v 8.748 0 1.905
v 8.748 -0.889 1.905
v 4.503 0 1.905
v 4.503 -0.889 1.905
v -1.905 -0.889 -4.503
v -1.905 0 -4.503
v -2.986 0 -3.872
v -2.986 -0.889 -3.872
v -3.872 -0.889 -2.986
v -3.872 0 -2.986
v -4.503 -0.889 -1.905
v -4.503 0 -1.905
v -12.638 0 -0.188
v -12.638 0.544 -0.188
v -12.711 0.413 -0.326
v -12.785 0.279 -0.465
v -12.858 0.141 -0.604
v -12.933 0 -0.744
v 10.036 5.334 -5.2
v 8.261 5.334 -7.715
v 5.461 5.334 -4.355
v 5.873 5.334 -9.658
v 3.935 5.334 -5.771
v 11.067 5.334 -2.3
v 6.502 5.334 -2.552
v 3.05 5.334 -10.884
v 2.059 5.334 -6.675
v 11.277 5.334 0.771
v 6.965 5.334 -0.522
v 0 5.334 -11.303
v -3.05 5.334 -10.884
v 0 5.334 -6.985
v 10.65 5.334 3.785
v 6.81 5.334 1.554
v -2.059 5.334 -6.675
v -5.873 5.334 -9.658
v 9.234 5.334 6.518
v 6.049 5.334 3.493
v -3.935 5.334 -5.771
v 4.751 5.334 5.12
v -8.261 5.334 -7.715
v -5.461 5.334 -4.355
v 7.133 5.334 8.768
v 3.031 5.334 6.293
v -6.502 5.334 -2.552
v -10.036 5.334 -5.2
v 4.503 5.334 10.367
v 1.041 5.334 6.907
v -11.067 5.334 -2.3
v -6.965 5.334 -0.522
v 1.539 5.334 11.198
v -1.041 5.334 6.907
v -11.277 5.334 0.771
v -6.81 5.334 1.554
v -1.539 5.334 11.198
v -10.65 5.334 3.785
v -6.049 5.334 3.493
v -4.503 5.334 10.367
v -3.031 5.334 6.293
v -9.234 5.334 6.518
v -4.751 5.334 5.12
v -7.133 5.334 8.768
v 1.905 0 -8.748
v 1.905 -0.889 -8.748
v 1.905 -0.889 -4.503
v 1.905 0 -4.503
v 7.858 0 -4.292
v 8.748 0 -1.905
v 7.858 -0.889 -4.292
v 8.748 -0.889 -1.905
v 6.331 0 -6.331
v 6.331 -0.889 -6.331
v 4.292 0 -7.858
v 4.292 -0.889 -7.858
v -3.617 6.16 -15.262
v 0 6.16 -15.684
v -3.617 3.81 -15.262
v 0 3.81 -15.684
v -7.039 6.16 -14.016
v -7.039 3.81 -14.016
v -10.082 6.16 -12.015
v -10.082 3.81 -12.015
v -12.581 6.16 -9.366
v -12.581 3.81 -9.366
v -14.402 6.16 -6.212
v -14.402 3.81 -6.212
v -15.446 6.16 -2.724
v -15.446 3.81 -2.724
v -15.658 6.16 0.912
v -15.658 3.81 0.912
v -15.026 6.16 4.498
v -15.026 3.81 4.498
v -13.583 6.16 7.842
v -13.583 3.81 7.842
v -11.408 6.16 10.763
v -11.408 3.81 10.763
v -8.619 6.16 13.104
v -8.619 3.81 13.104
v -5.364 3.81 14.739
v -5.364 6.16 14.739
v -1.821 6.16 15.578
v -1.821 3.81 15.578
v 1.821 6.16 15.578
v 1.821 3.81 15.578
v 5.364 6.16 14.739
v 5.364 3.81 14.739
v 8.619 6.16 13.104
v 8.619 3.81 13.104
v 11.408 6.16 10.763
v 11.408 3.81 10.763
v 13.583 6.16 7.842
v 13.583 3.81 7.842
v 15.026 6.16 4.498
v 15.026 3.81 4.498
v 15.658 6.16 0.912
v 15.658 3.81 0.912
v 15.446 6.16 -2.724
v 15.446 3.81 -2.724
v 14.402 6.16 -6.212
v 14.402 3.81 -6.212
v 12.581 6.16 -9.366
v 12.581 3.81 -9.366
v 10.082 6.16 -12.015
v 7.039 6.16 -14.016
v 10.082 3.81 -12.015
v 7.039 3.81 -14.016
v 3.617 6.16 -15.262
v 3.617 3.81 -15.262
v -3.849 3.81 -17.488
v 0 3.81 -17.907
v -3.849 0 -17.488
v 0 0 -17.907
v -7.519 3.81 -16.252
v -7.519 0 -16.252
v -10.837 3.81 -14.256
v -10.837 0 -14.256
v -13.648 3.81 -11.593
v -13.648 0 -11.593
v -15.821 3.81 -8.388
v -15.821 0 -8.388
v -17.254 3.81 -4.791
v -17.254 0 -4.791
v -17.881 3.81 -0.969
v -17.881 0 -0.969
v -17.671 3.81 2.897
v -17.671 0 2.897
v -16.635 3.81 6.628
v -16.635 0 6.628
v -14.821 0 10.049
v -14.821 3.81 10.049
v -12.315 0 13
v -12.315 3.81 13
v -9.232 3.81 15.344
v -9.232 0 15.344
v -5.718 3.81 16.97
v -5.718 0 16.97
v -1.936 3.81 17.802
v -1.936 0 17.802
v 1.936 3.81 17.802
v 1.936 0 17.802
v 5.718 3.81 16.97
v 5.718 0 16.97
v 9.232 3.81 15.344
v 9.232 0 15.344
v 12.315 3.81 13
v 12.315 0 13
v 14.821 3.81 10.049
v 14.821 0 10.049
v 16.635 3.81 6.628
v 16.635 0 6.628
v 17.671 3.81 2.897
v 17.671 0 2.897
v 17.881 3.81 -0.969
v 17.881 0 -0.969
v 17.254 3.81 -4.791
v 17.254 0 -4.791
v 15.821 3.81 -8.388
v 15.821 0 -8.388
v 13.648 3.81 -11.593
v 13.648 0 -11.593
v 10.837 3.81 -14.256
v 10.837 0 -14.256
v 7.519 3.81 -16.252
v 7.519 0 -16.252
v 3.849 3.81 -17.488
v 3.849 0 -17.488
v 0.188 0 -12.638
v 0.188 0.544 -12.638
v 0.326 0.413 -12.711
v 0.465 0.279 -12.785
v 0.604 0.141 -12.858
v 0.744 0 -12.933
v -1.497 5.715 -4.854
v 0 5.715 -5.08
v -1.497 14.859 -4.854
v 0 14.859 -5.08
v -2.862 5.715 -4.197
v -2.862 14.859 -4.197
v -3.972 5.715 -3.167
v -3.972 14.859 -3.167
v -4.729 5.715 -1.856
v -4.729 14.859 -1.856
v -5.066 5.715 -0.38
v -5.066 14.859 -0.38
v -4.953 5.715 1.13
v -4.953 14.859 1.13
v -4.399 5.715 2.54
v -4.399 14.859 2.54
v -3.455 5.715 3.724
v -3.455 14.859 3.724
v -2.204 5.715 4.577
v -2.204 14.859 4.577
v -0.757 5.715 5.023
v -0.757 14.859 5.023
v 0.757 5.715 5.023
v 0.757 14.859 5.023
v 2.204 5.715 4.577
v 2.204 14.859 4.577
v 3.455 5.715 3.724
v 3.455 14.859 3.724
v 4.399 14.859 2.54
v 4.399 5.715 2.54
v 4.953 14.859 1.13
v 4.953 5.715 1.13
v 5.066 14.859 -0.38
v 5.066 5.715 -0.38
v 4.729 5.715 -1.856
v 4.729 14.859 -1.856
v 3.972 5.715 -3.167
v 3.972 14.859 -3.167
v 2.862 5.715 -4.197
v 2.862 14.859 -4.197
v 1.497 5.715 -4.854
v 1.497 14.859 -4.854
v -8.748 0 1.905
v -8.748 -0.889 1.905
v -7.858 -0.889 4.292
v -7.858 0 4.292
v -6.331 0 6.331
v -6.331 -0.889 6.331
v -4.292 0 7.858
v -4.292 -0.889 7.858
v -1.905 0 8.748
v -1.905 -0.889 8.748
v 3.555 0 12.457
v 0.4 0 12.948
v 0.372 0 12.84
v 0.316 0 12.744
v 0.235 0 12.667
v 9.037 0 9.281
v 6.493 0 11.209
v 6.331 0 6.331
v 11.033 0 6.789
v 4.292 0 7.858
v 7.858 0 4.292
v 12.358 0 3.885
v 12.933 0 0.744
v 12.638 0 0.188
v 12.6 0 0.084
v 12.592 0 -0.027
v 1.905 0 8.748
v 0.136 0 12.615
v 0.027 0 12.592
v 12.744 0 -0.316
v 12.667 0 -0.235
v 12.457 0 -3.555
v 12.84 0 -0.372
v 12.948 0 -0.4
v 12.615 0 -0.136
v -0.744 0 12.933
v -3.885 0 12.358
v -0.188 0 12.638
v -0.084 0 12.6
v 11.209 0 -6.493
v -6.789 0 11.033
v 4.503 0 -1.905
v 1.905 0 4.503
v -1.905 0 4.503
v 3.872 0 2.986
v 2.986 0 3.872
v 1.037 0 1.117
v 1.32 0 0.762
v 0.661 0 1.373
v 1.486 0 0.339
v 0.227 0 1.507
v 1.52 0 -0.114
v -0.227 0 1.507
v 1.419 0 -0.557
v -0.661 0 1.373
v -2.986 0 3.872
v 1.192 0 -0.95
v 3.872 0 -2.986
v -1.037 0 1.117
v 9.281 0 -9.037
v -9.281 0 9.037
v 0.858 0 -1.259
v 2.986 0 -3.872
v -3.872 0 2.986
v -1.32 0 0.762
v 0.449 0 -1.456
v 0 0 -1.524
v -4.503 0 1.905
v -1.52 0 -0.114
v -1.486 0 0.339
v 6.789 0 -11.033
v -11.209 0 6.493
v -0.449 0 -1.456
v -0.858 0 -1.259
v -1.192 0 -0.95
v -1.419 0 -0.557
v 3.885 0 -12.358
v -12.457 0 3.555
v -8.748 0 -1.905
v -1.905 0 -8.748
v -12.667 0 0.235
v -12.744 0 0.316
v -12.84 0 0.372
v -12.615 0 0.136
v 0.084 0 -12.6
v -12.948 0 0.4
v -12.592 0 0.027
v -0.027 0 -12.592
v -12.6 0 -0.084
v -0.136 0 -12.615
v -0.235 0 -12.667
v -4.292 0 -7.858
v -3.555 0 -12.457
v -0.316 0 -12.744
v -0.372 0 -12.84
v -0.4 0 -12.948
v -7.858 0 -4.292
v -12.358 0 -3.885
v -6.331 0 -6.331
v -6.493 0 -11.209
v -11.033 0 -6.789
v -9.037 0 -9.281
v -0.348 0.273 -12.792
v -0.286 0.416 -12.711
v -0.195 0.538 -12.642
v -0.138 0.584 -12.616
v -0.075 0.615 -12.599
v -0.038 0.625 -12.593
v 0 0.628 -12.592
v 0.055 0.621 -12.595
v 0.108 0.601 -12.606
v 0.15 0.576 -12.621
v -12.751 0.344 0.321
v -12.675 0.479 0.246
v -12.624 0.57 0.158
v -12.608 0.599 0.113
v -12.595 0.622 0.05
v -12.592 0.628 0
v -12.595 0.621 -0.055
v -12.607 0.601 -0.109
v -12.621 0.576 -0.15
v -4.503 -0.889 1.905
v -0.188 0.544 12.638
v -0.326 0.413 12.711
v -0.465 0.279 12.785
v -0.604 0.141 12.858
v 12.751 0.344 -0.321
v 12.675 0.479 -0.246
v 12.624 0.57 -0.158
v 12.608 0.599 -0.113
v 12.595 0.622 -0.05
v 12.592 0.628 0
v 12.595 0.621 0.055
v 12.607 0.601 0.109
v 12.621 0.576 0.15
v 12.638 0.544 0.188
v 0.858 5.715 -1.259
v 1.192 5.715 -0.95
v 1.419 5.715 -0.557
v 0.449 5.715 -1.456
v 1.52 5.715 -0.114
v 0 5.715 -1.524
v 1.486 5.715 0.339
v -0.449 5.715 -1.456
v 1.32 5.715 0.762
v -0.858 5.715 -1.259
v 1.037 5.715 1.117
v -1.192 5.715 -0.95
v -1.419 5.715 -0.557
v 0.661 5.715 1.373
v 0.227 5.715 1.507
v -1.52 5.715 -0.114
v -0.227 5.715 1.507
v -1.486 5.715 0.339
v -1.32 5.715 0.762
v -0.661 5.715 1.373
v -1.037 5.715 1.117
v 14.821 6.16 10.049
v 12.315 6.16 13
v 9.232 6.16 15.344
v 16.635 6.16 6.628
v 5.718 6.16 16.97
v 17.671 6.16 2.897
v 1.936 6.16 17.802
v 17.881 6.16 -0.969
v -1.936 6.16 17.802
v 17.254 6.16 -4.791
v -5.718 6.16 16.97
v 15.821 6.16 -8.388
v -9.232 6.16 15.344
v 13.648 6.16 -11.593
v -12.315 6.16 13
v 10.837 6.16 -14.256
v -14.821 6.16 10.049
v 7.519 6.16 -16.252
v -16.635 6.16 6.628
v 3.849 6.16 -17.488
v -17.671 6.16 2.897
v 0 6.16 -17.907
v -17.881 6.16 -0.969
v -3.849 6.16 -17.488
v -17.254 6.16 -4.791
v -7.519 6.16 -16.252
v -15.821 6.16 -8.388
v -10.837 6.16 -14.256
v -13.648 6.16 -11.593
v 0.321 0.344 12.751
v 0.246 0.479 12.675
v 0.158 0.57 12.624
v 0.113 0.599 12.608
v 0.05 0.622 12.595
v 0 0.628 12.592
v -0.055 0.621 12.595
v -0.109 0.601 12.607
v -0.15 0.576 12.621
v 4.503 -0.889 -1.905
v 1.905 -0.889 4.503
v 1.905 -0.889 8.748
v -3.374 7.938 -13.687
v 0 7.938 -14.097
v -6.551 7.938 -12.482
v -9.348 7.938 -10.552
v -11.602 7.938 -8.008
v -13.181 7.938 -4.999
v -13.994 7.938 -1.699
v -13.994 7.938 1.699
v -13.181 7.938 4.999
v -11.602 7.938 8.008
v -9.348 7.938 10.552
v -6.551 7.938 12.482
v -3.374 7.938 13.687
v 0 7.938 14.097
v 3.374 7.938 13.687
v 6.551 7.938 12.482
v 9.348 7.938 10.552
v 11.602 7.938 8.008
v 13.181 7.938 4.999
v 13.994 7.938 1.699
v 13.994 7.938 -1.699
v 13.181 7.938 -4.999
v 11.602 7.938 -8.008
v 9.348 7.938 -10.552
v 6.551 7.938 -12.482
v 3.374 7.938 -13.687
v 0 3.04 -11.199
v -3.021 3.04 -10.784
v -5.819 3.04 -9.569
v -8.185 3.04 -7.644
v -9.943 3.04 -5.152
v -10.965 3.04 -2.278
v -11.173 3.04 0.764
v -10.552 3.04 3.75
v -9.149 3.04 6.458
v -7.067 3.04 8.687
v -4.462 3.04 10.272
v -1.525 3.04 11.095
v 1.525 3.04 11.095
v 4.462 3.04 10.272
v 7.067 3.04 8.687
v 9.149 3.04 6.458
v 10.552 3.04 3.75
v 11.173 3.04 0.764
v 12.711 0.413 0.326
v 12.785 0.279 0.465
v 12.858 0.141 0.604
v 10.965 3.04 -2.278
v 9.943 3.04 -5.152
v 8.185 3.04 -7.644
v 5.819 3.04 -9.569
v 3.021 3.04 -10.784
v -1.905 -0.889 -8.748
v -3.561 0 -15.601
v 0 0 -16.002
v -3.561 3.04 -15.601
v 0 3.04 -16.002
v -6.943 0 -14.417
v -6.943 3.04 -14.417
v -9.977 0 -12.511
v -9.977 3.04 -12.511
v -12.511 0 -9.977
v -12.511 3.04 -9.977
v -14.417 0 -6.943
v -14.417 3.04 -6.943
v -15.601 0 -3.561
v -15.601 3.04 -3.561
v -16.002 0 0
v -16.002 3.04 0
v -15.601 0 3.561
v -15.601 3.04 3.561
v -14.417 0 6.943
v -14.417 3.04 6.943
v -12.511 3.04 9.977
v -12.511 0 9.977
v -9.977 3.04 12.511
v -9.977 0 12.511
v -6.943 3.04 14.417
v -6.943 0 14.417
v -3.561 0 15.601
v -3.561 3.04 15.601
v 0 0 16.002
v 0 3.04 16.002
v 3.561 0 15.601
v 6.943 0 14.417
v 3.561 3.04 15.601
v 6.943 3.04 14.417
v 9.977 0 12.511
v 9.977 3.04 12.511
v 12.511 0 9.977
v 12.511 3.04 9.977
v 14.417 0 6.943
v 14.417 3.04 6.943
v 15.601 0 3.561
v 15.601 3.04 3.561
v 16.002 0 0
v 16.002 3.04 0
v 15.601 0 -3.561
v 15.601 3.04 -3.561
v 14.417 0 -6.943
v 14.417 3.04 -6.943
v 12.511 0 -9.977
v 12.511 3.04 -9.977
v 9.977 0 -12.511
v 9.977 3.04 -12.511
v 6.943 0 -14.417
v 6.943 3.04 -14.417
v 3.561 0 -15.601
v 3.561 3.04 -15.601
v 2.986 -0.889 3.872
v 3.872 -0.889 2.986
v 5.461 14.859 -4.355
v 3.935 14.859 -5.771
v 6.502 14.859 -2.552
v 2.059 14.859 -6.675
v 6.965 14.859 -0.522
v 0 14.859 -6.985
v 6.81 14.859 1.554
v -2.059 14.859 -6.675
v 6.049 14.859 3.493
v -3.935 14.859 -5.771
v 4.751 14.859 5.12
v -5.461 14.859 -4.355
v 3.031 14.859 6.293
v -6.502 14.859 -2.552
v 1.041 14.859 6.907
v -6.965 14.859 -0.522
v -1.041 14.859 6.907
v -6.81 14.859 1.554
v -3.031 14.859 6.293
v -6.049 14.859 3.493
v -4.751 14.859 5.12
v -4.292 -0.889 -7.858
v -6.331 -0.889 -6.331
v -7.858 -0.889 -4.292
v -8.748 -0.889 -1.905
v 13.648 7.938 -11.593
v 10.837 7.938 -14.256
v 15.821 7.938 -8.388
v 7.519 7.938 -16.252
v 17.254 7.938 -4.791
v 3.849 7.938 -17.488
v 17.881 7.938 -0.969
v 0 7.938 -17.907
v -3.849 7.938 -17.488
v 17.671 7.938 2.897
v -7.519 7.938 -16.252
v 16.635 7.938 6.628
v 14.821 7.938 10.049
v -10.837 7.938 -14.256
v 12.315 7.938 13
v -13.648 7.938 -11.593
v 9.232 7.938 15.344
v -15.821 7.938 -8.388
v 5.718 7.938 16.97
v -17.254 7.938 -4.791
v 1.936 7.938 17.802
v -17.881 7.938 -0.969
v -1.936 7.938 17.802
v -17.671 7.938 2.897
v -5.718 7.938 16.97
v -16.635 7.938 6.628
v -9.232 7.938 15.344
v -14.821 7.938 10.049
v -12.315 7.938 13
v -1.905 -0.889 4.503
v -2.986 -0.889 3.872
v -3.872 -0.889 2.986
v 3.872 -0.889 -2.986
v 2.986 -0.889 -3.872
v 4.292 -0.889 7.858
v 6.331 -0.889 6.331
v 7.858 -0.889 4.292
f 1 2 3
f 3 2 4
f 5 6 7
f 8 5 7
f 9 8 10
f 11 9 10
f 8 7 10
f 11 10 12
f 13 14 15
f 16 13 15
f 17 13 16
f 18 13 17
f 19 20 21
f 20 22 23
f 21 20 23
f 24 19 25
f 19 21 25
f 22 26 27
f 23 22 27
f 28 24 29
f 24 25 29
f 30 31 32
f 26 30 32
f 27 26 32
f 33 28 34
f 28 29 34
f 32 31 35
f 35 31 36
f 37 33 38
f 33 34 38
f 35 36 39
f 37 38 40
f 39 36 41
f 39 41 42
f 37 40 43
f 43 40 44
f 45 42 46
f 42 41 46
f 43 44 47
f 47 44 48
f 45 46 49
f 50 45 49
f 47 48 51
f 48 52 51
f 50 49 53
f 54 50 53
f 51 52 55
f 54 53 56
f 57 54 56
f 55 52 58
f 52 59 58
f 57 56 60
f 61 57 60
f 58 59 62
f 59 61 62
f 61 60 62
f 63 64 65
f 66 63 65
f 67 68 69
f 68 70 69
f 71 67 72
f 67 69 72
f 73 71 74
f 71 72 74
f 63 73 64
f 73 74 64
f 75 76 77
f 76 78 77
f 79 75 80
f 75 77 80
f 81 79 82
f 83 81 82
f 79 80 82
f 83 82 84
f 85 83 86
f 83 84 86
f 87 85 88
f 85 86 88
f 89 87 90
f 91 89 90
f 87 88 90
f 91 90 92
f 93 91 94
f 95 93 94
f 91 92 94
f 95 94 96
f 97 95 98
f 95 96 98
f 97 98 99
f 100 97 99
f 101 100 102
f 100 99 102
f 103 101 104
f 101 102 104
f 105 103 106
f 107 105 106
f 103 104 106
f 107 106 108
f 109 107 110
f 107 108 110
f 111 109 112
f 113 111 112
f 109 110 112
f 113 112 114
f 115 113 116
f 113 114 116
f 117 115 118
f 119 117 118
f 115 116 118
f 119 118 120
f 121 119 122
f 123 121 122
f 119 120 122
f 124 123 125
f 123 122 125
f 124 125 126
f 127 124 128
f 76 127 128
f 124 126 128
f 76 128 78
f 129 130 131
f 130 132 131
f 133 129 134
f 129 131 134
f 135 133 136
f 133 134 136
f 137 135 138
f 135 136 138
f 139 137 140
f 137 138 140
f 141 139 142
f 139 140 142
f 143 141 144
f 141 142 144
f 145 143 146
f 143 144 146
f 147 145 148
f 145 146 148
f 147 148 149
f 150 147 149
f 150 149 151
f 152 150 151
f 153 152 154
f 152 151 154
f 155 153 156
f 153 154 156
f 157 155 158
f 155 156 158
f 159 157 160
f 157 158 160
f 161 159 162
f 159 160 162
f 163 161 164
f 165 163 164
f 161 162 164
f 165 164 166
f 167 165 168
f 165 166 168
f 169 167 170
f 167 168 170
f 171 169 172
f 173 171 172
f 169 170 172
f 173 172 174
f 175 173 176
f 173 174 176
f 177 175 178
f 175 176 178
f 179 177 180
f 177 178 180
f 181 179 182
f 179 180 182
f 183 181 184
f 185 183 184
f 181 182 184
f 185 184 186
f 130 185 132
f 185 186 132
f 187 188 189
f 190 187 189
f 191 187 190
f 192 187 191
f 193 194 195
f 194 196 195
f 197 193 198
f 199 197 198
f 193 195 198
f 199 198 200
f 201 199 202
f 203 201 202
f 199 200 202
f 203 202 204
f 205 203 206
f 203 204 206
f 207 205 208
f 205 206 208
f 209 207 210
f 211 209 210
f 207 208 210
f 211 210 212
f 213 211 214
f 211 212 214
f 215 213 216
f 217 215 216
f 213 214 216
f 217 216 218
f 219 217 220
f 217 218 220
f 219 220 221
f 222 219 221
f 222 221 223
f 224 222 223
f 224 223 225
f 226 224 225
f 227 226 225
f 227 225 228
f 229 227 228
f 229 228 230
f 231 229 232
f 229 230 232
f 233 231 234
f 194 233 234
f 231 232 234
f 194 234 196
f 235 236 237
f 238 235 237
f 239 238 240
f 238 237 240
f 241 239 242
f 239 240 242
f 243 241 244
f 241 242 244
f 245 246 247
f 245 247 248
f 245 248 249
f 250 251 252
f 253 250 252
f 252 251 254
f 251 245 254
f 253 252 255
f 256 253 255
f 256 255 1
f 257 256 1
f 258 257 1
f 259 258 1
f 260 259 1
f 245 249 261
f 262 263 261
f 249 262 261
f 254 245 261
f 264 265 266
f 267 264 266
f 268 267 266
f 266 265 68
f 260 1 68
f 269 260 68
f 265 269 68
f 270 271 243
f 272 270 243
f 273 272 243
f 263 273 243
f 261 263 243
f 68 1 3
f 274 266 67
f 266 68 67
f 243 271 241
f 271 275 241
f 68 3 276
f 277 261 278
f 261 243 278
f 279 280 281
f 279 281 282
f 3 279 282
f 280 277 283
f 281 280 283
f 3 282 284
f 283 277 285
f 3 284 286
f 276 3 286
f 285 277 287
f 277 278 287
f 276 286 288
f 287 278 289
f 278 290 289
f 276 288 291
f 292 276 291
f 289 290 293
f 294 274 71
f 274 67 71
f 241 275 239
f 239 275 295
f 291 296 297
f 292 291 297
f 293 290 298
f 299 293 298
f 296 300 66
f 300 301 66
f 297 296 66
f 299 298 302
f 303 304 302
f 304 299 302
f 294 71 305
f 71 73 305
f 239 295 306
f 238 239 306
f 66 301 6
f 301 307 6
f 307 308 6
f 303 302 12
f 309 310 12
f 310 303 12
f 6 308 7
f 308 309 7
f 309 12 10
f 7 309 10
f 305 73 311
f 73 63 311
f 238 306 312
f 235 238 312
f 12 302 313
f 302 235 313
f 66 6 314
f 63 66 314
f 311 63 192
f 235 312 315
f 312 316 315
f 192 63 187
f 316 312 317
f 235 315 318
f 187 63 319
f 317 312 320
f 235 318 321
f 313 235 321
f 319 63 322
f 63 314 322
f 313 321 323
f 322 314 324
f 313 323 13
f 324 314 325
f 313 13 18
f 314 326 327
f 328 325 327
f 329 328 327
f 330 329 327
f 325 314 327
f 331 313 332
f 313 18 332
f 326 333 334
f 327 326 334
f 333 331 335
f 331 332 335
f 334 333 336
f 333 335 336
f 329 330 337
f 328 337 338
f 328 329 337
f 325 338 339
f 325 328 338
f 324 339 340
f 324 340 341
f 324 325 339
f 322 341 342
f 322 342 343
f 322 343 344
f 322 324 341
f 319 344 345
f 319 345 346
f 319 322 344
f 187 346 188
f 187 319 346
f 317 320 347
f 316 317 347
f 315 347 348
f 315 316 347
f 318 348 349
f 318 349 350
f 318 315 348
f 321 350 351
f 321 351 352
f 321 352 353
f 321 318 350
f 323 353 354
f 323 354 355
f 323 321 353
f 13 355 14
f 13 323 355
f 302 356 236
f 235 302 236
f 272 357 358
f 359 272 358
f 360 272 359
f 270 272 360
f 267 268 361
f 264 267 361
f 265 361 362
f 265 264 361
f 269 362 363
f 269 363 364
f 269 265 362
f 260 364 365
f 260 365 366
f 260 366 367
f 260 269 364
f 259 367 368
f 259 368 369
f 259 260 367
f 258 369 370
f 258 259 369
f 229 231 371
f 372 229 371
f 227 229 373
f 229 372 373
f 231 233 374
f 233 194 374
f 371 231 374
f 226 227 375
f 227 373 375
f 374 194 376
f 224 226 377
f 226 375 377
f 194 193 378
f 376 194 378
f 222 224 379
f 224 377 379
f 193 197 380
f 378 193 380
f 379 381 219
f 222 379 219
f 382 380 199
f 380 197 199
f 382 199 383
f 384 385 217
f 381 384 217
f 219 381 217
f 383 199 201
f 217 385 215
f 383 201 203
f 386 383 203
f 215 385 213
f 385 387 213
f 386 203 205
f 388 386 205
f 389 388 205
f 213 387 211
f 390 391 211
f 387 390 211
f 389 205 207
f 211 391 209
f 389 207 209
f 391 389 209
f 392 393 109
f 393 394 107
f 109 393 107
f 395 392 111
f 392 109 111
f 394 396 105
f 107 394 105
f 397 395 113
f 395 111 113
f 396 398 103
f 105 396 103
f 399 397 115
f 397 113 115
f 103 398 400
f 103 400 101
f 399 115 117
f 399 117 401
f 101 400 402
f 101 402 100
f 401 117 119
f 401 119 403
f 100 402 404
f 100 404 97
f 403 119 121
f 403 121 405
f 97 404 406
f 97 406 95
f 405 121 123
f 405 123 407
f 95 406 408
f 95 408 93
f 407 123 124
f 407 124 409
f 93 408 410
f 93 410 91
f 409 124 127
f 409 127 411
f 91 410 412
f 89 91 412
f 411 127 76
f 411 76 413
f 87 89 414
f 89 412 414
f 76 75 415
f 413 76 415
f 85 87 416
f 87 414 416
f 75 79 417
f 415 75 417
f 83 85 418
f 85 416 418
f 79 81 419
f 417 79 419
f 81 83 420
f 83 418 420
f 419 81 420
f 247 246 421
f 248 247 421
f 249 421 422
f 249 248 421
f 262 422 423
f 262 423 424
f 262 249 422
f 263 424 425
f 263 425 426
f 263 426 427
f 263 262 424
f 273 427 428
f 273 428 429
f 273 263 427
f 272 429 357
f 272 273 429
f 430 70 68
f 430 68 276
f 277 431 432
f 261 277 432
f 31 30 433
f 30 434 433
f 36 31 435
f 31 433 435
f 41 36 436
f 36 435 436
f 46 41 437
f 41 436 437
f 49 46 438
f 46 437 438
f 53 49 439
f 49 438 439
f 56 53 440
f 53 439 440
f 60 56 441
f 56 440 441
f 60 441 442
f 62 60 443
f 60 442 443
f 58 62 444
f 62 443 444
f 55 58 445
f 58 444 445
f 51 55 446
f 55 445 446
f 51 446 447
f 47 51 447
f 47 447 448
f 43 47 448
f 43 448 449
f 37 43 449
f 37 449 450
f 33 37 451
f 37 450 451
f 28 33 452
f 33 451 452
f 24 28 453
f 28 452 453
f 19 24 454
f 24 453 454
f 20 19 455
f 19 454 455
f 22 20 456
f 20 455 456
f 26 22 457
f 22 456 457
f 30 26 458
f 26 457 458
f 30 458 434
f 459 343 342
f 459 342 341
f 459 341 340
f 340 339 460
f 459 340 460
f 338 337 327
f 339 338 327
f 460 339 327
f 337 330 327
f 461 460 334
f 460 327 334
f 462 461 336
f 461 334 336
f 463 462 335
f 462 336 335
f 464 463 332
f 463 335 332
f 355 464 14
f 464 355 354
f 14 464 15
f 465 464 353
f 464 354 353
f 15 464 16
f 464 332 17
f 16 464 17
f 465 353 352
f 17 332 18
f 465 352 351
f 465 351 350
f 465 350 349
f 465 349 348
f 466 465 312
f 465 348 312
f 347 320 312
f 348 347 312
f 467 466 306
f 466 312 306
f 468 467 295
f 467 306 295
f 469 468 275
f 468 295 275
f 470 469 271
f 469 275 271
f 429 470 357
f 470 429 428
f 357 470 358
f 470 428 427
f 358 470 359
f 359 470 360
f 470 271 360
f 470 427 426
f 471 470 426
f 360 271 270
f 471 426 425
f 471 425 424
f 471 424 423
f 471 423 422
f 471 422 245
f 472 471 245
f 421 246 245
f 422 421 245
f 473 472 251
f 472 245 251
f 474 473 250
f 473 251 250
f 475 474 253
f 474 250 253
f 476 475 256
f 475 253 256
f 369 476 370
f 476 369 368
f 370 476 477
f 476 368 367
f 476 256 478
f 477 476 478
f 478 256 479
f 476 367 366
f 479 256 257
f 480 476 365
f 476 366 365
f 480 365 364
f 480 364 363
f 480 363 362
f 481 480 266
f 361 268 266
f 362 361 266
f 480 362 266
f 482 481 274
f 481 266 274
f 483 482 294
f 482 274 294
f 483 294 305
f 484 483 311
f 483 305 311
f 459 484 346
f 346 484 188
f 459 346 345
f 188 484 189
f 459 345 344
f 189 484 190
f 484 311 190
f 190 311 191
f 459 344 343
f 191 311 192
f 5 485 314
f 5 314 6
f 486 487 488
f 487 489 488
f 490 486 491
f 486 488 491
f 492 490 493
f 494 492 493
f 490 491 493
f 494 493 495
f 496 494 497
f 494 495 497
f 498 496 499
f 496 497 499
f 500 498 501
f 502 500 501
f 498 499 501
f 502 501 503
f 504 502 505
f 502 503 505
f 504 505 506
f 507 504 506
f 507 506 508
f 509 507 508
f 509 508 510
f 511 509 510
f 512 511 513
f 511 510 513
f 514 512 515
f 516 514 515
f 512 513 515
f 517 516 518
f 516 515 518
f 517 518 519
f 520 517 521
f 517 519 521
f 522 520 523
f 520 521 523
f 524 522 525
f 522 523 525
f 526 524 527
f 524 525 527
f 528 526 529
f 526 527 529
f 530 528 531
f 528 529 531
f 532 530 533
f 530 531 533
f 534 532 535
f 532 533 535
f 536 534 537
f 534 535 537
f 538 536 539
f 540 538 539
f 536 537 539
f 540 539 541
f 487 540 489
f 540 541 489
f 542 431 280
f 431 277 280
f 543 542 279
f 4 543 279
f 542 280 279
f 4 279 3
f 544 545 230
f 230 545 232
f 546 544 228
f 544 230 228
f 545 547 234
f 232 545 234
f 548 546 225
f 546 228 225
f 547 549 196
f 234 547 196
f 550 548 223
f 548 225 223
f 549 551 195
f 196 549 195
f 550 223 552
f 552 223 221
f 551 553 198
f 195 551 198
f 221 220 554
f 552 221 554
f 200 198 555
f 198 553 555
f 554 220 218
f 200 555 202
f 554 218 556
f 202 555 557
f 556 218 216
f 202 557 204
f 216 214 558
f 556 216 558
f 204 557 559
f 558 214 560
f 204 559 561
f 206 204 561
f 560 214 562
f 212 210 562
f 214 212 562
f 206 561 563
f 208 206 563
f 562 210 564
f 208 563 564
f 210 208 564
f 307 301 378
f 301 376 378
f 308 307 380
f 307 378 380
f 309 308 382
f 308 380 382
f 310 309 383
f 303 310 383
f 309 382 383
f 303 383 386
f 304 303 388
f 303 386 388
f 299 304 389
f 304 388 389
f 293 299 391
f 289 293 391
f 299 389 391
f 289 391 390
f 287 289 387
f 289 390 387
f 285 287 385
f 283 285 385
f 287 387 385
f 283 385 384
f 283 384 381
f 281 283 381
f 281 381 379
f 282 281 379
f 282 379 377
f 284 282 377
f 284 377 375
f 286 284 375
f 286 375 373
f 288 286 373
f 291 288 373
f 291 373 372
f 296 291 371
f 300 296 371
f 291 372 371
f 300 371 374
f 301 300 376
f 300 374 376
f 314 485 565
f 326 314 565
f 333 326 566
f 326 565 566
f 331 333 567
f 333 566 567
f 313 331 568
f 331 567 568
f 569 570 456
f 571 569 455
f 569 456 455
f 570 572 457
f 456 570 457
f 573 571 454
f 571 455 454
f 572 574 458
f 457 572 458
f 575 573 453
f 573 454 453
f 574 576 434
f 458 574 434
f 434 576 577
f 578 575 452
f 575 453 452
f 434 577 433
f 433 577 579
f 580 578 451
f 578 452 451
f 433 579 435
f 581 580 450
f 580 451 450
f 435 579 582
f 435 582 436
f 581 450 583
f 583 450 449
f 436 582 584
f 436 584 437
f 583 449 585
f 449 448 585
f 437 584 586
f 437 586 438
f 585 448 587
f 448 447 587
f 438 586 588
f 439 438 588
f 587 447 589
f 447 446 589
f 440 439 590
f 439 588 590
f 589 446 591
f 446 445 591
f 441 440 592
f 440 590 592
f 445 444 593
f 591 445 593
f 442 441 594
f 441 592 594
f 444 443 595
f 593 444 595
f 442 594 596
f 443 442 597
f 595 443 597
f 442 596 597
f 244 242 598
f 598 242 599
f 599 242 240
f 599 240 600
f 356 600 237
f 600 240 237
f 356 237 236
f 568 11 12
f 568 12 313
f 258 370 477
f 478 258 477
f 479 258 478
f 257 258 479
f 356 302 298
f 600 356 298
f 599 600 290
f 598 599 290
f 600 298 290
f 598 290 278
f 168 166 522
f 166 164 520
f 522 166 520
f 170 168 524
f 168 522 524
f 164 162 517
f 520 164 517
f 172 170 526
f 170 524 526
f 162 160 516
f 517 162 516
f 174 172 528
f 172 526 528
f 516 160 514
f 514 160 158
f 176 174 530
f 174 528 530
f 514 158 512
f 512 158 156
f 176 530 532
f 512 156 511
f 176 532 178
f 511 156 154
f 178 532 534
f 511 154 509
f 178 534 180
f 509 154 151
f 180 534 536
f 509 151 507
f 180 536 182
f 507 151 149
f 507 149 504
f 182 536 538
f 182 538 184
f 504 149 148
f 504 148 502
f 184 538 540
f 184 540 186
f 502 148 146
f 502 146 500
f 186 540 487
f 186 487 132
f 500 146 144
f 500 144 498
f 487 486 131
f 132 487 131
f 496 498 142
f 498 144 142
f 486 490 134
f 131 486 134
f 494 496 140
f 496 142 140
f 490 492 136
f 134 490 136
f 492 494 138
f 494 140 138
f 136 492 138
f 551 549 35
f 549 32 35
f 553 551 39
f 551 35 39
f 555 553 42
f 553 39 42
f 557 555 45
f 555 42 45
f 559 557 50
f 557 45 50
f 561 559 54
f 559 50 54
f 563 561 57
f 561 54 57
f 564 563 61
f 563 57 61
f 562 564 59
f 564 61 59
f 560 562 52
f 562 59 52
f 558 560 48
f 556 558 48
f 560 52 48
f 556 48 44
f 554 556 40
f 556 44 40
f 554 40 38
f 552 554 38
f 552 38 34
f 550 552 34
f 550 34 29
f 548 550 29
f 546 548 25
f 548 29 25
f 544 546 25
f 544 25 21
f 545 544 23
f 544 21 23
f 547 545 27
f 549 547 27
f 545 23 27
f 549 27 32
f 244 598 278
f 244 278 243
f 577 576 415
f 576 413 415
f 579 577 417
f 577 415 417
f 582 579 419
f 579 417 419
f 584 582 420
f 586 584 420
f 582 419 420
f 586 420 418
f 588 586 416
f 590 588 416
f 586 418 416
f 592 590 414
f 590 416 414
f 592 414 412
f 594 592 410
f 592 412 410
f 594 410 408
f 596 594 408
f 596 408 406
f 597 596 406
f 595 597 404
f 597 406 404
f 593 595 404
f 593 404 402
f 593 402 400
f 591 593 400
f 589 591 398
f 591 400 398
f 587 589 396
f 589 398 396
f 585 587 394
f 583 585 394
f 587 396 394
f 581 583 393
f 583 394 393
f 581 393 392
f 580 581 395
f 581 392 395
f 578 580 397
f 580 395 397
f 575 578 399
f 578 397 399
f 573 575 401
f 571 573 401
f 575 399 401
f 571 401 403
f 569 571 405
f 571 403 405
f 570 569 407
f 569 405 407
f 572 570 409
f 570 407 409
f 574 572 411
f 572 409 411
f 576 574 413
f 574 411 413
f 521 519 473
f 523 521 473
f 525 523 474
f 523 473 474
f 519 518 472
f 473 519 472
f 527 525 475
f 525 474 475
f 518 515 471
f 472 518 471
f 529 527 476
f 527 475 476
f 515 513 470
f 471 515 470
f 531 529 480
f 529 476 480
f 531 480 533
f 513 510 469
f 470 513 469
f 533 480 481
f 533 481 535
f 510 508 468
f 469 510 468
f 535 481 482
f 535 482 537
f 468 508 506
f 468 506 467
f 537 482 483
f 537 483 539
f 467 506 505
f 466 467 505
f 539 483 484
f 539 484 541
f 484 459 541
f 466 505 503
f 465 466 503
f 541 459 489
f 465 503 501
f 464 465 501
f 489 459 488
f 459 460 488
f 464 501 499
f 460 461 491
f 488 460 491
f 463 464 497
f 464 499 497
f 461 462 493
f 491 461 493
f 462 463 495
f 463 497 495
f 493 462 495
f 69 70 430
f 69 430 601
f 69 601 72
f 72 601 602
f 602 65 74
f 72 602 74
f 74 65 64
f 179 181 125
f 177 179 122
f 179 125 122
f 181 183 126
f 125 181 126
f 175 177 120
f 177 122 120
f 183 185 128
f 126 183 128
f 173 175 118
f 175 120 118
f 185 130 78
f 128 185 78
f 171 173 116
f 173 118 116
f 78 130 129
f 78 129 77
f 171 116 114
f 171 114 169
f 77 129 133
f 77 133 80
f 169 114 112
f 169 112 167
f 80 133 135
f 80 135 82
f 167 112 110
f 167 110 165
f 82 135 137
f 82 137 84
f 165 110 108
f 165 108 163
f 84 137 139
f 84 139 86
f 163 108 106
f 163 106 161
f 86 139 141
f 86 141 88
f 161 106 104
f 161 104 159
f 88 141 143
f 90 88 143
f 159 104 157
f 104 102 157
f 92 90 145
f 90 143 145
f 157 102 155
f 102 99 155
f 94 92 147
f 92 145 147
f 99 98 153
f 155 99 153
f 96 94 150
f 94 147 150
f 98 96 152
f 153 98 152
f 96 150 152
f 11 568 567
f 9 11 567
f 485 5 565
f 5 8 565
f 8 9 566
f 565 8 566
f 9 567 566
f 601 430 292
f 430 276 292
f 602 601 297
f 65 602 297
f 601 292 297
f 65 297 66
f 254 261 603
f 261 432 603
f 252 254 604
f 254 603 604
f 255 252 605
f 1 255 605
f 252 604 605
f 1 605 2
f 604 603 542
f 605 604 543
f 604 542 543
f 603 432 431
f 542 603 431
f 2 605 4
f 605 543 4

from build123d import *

# Parameters (mm, degrees)
SKETCH2_W          = 8.307416394
SKETCH2_H          = 3.81
SKETCH2_W_2        = 3.81
SKETCH2_H_2        = 8.307416394
CUT_EXTRUDE1_DEPTH = 0.889
CUT_EXTRUDE2_DEPTH = 1.778


with BuildPart() as part:
    # Sketch1 → Revolve1 (revolve)
    with BuildSketch(Plane.XY):
        Polygon((5.08, 14.859), (6.985, 14.859), (6.985, 5.334), (11.303, 5.334), (14.097, 7.9375), (17.907, 7.9375), (17.907, 6.1595), (15.6845, 6.1595), (15.6845, 3.81), (17.907, 3.81), (17.907, 0), (16.002, 0), (16.002, 3.039995698), (11.198857665, 3.039995698), (12.954, 0), (8.9535, 0), (8.9535, -0.889), (4.8895, -0.889), (4.8895, 0), (1.524, 0), (1.524, 5.715), (5.08, 5.715), align=None)
    revolve(axis=Axis((0, 0, 0), (0, 1, 0)))

    # Sketch2 → Cut-Extrude1 (cut)
    with BuildSketch(Plane(origin=(0, -0.889, 0), x_dir=(-1, 0, 0), z_dir=(0, 1, 0))):
        with Locations((6.058708197, 0)):
            Rectangle(SKETCH2_W, SKETCH2_H)
        with Locations((0, 6.058708197)):
            Rectangle(SKETCH2_W_2, SKETCH2_H_2)
        with Locations((0, -6.058708197)):
            Rectangle(SKETCH2_W_2, SKETCH2_H_2)
        with Locations((-6.058708197, 0)):
            Rectangle(SKETCH2_W, SKETCH2_H)
    extrude(amount=CUT_EXTRUDE1_DEPTH, mode=Mode.SUBTRACT)

    # Sketch2<3> → Cut-Extrude2 (cut)
    with BuildSketch(Plane(origin=(0, -0.889, 0), x_dir=(-1, 0, 0), z_dir=(0, 1, 0))):
        with BuildLine():
            ThreePointArc((-0.402826973, 12.988197288), (-0.205131646, 12.64770122), (0.188485038, 12.638378045))
            Line((0.188485038, 12.638378045), (0.813026828, 12.96898322))
            ThreePointArc((0.813026828, 12.96898322), (0.205324805, 12.992820329), (-0.402826973, 12.988197288))
        make_face()
        with BuildLine():
            ThreePointArc((12.988197288, 0.402826973), (12.64770122, 0.205131646), (12.638378045, -0.188485038))
            Line((12.638378045, -0.188485038), (12.96898322, -0.813026828))
            ThreePointArc((12.96898322, -0.813026828), (12.992820329, -0.205324805), (12.988197288, 0.402826973))
        make_face()
        with BuildLine():
            ThreePointArc((0.402826973, -12.988197288), (0.205131646, -12.64770122), (-0.188485038, -12.638378045))
            Line((-0.188485038, -12.638378045), (-0.813026828, -12.96898322))
            ThreePointArc((-0.813026828, -12.96898322), (-0.205324805, -12.992820329), (0.402826973, -12.988197288))
        make_face()
        with BuildLine():
            ThreePointArc((-12.988197288, -0.402826973), (-12.64770122, -0.205131646), (-12.638378045, 0.188485038))
            Line((-12.638378045, 0.188485038), (-12.96898322, 0.813026828))
            ThreePointArc((-12.96898322, 0.813026828), (-12.992820329, 0.205324805), (-12.988197288, -0.402826973))
        make_face()
    extrude(amount=CUT_EXTRUDE2_DEPTH, mode=Mode.SUBTRACT)


solid = part.part
